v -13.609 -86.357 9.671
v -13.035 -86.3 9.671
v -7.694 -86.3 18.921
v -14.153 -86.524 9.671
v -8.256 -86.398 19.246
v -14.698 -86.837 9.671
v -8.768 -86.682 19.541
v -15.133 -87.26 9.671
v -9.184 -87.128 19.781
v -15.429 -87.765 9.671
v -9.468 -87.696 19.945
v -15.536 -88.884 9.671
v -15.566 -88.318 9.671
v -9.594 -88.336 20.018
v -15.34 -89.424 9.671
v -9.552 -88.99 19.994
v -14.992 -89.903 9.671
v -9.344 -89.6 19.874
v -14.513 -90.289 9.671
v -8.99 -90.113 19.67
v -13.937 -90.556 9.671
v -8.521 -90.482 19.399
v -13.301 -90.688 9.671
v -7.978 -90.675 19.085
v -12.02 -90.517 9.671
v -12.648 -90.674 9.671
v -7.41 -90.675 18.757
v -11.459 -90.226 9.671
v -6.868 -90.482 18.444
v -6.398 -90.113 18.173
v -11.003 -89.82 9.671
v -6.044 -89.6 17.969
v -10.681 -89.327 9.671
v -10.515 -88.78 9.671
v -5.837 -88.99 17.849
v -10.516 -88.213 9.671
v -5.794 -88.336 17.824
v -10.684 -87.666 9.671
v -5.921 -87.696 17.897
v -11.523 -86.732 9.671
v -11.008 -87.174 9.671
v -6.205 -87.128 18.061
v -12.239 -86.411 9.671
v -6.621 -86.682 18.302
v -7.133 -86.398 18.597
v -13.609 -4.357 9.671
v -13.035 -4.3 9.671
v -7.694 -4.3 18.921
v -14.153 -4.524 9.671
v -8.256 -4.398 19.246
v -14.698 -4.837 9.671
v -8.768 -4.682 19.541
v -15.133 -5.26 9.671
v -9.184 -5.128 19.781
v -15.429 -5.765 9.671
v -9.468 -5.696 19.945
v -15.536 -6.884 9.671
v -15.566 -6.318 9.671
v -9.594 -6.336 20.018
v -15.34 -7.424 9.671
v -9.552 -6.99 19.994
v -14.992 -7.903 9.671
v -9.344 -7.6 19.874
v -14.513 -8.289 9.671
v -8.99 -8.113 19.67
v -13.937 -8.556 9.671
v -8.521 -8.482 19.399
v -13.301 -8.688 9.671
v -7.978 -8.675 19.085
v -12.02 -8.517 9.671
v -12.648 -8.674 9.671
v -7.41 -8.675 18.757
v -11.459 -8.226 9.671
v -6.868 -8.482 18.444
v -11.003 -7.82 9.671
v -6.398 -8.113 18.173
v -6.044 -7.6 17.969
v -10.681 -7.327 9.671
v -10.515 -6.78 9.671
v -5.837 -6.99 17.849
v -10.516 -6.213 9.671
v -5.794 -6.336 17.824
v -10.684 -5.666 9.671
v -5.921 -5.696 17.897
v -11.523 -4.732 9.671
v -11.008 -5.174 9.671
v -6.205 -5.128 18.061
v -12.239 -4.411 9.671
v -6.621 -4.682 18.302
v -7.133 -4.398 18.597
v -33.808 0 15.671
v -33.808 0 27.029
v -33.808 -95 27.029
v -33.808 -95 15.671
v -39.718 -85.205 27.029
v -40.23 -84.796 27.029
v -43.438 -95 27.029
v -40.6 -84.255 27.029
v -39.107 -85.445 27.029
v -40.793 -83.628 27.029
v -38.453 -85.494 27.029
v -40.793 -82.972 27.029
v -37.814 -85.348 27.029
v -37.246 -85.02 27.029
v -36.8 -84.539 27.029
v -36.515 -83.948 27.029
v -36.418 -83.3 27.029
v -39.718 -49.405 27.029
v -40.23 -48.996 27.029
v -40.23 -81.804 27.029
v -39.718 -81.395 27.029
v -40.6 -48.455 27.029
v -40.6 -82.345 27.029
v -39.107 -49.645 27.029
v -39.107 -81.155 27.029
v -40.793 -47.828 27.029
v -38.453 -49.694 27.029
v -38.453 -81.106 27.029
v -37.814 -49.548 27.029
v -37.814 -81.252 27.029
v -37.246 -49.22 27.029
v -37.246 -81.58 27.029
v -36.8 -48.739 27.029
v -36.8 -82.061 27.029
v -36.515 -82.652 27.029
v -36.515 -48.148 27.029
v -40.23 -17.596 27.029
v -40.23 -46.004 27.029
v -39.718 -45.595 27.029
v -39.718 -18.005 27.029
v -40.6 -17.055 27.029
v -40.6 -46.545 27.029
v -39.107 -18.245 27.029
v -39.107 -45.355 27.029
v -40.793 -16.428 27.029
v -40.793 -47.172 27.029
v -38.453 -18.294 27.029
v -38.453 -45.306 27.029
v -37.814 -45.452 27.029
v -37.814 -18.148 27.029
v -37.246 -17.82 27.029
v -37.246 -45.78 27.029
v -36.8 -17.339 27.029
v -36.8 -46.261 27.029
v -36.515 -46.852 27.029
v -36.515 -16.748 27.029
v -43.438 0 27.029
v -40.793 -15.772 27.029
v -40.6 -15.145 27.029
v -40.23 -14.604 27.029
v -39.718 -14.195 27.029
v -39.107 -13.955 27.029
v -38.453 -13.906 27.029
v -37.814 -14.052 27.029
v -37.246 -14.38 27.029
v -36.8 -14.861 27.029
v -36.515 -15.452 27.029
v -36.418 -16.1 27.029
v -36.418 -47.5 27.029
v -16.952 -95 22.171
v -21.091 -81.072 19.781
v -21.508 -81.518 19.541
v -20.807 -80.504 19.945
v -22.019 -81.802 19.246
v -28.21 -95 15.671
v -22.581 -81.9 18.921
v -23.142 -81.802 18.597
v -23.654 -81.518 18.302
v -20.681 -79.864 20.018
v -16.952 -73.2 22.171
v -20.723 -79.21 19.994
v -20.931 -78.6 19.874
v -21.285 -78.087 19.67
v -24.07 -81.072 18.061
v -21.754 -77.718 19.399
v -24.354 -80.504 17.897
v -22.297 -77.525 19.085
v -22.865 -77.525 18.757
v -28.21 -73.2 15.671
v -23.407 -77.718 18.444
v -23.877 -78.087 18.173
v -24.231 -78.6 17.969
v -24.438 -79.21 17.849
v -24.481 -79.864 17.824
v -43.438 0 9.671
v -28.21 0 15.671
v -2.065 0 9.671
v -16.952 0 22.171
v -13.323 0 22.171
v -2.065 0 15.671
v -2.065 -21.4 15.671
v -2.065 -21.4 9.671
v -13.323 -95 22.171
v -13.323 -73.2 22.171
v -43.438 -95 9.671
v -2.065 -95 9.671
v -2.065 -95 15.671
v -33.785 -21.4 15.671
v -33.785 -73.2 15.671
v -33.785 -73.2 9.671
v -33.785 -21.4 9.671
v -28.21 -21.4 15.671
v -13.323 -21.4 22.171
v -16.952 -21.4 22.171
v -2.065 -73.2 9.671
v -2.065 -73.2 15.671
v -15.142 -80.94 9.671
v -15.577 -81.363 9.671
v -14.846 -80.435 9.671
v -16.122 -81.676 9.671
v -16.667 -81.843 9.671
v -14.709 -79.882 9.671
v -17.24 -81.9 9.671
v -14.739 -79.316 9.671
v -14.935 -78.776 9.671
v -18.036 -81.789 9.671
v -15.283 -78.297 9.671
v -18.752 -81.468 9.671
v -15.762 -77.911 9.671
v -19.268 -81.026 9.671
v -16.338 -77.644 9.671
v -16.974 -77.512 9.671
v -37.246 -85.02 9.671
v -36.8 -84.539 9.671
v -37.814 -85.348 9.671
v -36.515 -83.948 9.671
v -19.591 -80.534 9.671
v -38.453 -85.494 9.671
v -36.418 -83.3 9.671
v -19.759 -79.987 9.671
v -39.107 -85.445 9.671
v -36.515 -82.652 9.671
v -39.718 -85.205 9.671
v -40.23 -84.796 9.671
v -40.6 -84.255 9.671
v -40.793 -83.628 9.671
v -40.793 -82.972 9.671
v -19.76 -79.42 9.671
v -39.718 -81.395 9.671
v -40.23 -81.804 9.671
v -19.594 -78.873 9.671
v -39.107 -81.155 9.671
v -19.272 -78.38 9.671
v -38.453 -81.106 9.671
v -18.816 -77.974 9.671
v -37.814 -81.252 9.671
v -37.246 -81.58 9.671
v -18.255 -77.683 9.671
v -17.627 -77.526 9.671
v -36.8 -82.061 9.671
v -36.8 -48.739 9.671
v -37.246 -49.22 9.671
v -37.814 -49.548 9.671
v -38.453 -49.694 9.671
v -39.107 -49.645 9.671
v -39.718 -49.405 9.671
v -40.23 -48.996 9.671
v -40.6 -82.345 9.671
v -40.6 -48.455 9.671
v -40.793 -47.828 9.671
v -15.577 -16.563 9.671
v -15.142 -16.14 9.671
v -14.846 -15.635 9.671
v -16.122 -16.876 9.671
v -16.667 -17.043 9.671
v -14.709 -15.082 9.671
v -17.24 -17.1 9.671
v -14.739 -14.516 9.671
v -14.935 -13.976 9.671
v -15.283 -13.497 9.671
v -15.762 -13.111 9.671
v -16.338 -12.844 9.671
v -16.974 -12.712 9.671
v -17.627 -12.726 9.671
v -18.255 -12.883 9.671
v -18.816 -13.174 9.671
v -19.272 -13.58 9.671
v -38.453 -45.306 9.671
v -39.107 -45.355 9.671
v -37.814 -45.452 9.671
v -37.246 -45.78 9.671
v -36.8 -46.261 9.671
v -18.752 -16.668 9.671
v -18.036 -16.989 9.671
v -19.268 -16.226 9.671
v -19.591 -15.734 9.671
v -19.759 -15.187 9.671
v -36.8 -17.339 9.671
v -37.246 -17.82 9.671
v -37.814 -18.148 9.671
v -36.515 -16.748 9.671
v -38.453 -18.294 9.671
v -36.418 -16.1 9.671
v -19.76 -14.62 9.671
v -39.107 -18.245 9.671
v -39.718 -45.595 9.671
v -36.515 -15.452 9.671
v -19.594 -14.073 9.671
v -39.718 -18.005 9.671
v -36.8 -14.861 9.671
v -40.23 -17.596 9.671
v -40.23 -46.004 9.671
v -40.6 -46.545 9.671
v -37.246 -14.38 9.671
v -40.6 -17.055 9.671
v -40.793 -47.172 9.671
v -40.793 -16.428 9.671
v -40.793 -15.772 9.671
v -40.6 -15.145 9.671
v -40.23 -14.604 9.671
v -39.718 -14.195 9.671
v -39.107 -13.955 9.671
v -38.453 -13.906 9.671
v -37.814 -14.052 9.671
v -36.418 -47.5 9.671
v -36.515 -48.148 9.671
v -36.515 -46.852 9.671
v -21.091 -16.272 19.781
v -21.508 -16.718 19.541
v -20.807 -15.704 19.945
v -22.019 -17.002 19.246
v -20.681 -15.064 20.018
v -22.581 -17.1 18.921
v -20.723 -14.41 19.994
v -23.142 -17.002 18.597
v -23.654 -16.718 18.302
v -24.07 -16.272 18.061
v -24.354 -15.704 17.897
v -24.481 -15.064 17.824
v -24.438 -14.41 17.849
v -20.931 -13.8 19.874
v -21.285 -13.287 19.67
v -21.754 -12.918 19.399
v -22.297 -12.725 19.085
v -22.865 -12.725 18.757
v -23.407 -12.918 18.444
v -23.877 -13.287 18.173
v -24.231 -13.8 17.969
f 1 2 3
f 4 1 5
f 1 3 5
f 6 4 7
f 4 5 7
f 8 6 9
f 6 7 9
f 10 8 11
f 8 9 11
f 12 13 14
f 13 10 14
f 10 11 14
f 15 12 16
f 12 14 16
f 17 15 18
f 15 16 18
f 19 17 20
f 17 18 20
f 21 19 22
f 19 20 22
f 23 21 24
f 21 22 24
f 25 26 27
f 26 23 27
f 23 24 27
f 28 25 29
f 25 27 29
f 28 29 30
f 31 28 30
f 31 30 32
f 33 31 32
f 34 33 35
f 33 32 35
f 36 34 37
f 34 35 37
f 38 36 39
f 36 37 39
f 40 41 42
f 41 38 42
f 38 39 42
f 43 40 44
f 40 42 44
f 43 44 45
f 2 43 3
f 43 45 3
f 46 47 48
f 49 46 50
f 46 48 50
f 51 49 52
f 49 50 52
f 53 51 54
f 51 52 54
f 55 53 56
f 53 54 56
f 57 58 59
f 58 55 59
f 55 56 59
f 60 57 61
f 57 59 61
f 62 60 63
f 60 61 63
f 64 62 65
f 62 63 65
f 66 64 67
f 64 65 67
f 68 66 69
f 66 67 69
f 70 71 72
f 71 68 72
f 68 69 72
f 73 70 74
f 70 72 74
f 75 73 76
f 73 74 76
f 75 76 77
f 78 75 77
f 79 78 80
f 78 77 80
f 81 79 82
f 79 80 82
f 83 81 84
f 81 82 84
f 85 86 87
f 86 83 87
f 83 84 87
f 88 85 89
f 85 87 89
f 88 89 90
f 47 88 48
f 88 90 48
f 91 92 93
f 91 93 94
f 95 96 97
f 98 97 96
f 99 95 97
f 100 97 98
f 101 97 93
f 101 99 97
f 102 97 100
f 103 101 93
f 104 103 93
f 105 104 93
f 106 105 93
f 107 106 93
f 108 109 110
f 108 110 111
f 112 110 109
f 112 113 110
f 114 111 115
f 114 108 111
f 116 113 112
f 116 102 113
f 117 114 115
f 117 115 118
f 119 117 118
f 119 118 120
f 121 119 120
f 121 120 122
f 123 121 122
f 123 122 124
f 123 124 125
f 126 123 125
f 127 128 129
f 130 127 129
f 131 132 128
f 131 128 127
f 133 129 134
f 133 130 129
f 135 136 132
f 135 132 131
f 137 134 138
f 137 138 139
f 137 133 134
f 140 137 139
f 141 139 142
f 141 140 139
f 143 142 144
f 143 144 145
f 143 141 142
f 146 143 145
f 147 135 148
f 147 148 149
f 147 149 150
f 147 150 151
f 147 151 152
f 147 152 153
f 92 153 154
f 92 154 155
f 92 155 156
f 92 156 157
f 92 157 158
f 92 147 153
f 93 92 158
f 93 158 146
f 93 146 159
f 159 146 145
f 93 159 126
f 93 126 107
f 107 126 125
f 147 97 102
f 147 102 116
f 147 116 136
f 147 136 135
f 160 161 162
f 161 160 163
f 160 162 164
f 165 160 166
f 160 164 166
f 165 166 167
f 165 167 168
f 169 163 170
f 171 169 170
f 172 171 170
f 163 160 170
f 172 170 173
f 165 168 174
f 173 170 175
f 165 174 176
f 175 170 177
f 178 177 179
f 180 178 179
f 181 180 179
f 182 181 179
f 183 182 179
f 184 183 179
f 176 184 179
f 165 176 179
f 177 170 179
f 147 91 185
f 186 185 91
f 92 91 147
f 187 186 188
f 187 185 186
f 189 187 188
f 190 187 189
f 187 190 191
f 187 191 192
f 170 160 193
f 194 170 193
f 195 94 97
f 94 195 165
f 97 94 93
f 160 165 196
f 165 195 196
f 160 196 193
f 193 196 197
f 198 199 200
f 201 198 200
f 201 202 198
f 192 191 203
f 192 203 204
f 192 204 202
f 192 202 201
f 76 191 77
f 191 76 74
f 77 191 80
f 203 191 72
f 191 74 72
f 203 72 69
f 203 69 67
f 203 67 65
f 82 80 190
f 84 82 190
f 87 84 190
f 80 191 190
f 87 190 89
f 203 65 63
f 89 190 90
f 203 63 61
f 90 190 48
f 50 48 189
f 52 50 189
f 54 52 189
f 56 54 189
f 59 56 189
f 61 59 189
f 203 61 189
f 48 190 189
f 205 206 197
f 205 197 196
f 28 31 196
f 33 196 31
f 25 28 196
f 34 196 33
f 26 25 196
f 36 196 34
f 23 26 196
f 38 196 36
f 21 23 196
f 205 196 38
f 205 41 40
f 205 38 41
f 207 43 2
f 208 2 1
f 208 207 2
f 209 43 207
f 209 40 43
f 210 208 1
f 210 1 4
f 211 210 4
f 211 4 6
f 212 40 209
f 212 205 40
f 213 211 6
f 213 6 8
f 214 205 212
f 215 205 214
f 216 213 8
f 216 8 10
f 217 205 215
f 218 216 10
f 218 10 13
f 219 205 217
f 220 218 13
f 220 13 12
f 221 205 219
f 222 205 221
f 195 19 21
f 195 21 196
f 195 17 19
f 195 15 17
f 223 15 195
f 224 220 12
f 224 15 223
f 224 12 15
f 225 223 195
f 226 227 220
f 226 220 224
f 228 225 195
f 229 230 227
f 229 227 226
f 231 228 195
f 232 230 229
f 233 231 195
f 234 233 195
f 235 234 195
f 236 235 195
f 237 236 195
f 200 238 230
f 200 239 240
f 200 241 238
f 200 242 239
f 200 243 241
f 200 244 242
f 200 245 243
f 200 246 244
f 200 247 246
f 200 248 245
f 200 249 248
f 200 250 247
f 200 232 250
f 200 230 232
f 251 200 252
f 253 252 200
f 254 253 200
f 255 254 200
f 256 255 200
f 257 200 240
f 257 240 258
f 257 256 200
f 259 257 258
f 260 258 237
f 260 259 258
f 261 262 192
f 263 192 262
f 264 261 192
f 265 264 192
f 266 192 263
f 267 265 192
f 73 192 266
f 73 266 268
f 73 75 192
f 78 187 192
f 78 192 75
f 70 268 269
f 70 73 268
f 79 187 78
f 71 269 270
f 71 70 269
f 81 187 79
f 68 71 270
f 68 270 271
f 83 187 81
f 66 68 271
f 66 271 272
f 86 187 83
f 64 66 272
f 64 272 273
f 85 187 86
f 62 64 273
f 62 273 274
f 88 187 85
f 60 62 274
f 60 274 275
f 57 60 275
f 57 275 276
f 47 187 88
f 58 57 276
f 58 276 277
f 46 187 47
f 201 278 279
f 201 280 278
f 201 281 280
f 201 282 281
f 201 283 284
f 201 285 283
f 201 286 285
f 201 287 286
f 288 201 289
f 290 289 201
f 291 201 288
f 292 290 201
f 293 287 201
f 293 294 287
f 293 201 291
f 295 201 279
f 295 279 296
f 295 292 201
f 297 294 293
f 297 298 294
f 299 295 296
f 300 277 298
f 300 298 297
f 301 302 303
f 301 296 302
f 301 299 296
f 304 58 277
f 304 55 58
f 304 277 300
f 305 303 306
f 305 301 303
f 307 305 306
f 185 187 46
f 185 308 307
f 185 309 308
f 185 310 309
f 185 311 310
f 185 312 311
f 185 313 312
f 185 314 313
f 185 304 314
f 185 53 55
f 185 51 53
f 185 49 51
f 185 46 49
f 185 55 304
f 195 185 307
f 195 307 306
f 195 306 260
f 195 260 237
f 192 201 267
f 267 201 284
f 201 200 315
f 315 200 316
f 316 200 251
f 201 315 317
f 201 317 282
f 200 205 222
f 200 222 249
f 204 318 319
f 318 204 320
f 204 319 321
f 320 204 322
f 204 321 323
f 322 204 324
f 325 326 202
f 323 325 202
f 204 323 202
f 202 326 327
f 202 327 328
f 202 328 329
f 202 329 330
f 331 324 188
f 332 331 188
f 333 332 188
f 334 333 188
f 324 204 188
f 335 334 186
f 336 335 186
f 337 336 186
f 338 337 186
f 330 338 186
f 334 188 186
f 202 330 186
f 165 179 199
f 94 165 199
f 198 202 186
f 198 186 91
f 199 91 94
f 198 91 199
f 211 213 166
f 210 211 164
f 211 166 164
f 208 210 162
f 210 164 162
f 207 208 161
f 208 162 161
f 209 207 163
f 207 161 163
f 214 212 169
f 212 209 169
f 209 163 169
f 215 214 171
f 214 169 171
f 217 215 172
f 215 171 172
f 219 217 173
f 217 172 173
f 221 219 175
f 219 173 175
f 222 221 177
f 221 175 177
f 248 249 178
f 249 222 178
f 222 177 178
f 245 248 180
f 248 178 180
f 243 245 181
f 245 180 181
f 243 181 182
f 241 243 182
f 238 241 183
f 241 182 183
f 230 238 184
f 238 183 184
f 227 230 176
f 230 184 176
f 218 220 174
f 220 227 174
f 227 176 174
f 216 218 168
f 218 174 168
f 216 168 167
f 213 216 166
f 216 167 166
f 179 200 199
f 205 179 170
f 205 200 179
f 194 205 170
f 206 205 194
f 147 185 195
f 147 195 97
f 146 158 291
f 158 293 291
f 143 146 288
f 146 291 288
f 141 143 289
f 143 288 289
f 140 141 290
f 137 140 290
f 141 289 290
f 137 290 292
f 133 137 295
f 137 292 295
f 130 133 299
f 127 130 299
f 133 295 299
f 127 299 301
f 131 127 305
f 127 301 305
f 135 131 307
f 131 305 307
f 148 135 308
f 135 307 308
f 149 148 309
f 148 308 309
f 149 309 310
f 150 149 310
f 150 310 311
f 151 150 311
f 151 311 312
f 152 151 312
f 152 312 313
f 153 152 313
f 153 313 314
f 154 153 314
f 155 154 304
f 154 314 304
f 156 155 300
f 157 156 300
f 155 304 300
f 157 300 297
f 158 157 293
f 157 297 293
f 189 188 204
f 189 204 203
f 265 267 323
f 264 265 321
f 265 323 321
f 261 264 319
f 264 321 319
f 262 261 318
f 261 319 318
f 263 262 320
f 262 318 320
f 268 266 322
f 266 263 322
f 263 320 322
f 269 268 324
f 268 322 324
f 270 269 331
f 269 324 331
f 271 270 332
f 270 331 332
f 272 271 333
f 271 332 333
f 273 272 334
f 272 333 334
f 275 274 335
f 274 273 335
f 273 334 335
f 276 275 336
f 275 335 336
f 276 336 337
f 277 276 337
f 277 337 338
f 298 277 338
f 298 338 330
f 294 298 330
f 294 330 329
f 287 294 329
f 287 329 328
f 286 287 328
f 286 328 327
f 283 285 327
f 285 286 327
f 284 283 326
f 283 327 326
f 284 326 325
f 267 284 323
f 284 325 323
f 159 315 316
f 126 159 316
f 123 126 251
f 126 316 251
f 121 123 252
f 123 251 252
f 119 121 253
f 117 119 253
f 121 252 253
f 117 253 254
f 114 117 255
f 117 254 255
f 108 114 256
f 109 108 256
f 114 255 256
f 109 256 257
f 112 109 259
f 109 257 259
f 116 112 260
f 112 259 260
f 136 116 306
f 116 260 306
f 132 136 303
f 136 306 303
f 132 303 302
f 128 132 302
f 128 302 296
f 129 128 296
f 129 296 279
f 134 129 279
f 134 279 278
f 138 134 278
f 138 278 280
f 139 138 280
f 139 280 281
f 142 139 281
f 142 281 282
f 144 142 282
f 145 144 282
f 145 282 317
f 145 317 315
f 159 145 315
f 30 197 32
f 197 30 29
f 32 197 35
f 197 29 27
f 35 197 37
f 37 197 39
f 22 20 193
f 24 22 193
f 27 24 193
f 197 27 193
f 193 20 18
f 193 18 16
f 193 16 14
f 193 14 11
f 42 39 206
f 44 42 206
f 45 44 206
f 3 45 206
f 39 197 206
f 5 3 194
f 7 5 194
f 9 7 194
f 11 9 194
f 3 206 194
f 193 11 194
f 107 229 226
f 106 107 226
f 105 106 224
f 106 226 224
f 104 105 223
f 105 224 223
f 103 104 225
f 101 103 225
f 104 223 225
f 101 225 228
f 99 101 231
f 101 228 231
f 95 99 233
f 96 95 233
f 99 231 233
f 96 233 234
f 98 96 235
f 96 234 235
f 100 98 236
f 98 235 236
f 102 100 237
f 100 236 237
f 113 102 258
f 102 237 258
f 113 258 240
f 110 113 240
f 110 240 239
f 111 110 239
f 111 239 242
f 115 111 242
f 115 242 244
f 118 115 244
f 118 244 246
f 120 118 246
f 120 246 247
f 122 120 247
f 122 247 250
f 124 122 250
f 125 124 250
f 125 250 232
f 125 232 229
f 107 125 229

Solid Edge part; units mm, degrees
sketch "Sketch1" plane through (0, 0, 0) normal (0, -1, 0) x (1, 0, 0)
  line L0 (-33.8082, 27.0293) -> (-33.8082, 15.6714)
  line L1 (-28.21, 15.6714) -> (-33.8082, 15.6714)
  line L2 (-16.9516, 22.1714) -> (-28.21, 15.6714)
  line L3 (-16.9516, 22.1714) -> (-13.3234, 22.1714)
  line L4 (-2.0651, 15.6714) -> (-13.3234, 22.1714)
  line L5 (-2.0651, 15.6714) -> (-2.0651, 9.6714)
  line L6 (-2.0651, 9.6714) -> (-43.4375, 9.6714)
  line L7 (-43.4375, 9.6714) -> (-43.4375, 27.0293)
  line L8 (-43.4375, 27.0293) -> (-33.8082, 27.0293)
  dimension "D1" = 6
extrude "ExtrudedProtrusion_1" add sketch "Sketch1" along normal blind 95
sketch "Sketch2" plane through (-22.7513, -47.5, 9.6714) normal (0, 0, -1) x (1, 0, 0)
  circle A0 centre (-15.8662, -31.4) radius 2.2
  circle A1 centre (-15.8662, 0) radius 2.2
  circle A2 centre (-15.8662, 35.8) radius 2.2
extrude "Cutout1" cut sketch "Sketch2" against normal blind 152.8035
sketch "Sketch3" plane through (-7.6943, -47.5, 18.9214) normal (0.5, 0, 0.866) x (0, 1, 0)
  circle A0 centre (41, 0) radius 2.2
  circle A1 centre (-41, 0) radius 2.2
  dimension "D1" = 6.5
  dimension "D2" = 6.5
  dimension "D3" = 6.5
extrude "ExtrudedCutout_2" cut sketch "Sketch3" against normal blind 455.9442
sketch "Sketch4" plane through (-22.5808, -47.5, 18.9214) normal (-0.5, 0, 0.866) x (0, -1, 0)
  circle A0 centre (32.2, 0) radius 2.2
  circle A1 centre (-32.6, 0) radius 2.2
  dimension "D1" = 4.4
  dimension "D2" = 4.4
  dimension "D3" = 6.5
  dimension "D4" = 4
  dimension "D5" = 4.4
extrude "ExtrudedCutout_3" cut sketch "Sketch4" against normal blind 76.0827
sketch "Sketch5" plane through (-2.0651, -47.5, 12.6714) normal (1, 0, 0) x (0, 1, 0)
  line L0 (-25.7, -3) -> (-25.7, 11)
  line L1 (-25.7, 11) -> (26.1, 11)
  line L2 (26.1, 11) -> (26.1, -3)
  line L3 (26.1, -3) -> (-25.7, -3)
  dimension "D1" = 4.3
  dimension "D2" = 4.3
  dimension "D3" = 14
extrude "ExtrudedCutout_4" cut sketch "Sketch5" against normal blind 31.7196
